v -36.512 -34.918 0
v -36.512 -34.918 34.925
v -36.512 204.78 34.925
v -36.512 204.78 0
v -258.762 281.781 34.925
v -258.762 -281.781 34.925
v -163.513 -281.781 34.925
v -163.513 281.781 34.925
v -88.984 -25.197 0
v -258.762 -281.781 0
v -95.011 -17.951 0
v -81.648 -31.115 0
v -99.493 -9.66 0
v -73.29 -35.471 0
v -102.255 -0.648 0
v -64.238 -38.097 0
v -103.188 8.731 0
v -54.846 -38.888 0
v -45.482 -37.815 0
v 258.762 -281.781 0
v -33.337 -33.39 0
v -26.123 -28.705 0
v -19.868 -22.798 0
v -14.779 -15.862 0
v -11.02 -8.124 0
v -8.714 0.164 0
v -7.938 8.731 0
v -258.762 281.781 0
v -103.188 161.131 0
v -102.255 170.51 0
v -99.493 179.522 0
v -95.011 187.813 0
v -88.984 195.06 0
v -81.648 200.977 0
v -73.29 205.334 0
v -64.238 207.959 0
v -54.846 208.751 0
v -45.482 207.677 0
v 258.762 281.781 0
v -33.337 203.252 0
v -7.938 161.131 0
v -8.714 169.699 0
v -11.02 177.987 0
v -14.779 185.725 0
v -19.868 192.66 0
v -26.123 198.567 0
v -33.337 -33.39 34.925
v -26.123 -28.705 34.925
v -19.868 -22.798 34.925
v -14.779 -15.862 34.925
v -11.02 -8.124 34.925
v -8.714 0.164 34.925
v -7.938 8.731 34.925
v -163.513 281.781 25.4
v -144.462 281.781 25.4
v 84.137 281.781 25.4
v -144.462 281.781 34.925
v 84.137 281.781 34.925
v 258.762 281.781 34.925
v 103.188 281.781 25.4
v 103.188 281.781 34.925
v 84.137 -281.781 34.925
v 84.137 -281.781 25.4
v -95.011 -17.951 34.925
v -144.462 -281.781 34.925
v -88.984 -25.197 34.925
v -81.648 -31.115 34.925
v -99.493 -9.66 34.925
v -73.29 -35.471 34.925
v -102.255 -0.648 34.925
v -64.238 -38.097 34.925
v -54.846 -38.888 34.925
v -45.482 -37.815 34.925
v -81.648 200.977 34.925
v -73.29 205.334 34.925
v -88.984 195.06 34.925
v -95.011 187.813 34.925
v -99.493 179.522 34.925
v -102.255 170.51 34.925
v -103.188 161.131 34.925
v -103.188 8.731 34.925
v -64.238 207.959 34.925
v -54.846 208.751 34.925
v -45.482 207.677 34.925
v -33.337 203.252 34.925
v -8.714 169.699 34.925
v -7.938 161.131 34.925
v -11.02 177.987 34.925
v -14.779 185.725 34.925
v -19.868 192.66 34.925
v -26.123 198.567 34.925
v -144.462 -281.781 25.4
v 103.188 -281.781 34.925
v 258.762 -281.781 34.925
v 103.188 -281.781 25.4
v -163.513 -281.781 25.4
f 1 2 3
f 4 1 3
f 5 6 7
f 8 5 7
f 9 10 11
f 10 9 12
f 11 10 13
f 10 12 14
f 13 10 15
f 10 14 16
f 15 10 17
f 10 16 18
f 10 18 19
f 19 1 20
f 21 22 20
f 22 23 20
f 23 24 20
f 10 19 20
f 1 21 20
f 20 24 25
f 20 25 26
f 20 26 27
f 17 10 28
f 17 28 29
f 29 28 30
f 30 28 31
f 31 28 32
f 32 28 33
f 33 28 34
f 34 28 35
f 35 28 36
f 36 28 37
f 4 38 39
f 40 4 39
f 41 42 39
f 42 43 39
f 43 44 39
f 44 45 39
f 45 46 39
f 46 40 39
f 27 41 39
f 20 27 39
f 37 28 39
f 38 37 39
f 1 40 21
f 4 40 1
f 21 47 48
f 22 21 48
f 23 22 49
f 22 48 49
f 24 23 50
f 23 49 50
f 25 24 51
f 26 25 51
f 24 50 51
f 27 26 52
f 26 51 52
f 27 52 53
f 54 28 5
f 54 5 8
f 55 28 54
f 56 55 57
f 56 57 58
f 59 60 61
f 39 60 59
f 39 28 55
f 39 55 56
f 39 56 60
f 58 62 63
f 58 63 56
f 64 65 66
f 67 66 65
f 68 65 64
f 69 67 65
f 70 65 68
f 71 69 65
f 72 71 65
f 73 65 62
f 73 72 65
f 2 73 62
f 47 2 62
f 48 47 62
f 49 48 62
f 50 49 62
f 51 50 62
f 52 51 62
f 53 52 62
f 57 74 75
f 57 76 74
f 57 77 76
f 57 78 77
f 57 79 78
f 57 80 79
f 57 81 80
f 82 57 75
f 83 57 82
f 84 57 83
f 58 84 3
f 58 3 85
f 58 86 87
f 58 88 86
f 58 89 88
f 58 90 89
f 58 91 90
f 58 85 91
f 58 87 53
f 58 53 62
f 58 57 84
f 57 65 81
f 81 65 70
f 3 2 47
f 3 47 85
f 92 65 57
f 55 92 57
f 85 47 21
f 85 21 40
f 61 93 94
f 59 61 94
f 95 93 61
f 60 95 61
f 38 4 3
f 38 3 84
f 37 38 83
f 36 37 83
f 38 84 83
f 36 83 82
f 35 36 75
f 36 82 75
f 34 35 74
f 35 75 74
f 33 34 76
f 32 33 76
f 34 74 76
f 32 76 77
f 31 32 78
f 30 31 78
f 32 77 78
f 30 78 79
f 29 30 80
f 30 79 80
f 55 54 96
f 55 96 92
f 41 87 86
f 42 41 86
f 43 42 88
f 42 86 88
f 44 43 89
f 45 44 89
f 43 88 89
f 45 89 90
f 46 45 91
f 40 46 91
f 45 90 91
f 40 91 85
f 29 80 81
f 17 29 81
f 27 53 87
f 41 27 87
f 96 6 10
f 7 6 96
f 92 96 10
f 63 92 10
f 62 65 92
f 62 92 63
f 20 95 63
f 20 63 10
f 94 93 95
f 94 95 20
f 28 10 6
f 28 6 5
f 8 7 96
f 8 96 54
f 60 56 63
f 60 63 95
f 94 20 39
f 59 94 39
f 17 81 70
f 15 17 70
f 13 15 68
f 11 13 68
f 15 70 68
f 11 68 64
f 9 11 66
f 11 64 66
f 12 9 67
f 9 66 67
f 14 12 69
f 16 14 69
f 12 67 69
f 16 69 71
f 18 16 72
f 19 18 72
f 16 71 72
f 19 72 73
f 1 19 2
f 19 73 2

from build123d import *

# Parameters (mm, degrees)
SKETCH_W        = 517.525
SKETCH_H        = 563.5625
PAD_DEPTH       = 34.925
SKETCH001_W     = 19.05
SKETCH001_H     = 563.5625
POCKET_DEPTH    = 9.525
POCKET001_DEPTH = 34.926
SKETCH003_W     = 3.175
SKETCH003_H     = 563.5625
PAD001_DEPTH    = 34.925


with BuildPart() as part:
    # Sketch → Pad (new body)
    with BuildSketch(Plane.XY):
        Rectangle(SKETCH_W, SKETCH_H)
    extrude(amount=PAD_DEPTH)

    # Sketch001 (on Face6 of Pad) → Pocket (cut)
    with BuildSketch(Plane.XY.offset(34.925)):
        with Locations((-153.9875, 0)):
            Rectangle(SKETCH001_W, SKETCH001_H)
        with Locations((93.6625, 0)):
            Rectangle(SKETCH001_W, SKETCH001_H)
    extrude(amount=-POCKET_DEPTH, mode=Mode.SUBTRACT)

    # Sketch002 (on Face9 of Pocket) → Pocket001 (cut, through all)
    with BuildSketch(Plane.XY.offset(34.925)):
        with BuildLine():
            ThreePointArc((-7.9375, 161.13125), (-55.5625, 208.75625), (-103.1875, 161.13125))
            Line((-103.1875, 161.13125), (-103.1875, 8.73125))
            ThreePointArc((-103.1875, 8.73125), (-55.5625, -38.89375), (-7.9375, 8.73125))
            Line((-7.9375, 8.73125), (-7.9375, 161.13125))
        make_face()
    extrude(amount=-POCKET001_DEPTH, mode=Mode.SUBTRACT)

    # Sketch003 (on Face9 of Pocket001) → Pad001 (join)
    with BuildSketch(Plane.XY.offset(34.925)):
        with Locations((-34.925, 0)):
            Rectangle(SKETCH003_W, SKETCH003_H)
    extrude(amount=-PAD001_DEPTH)


solid = part.part
